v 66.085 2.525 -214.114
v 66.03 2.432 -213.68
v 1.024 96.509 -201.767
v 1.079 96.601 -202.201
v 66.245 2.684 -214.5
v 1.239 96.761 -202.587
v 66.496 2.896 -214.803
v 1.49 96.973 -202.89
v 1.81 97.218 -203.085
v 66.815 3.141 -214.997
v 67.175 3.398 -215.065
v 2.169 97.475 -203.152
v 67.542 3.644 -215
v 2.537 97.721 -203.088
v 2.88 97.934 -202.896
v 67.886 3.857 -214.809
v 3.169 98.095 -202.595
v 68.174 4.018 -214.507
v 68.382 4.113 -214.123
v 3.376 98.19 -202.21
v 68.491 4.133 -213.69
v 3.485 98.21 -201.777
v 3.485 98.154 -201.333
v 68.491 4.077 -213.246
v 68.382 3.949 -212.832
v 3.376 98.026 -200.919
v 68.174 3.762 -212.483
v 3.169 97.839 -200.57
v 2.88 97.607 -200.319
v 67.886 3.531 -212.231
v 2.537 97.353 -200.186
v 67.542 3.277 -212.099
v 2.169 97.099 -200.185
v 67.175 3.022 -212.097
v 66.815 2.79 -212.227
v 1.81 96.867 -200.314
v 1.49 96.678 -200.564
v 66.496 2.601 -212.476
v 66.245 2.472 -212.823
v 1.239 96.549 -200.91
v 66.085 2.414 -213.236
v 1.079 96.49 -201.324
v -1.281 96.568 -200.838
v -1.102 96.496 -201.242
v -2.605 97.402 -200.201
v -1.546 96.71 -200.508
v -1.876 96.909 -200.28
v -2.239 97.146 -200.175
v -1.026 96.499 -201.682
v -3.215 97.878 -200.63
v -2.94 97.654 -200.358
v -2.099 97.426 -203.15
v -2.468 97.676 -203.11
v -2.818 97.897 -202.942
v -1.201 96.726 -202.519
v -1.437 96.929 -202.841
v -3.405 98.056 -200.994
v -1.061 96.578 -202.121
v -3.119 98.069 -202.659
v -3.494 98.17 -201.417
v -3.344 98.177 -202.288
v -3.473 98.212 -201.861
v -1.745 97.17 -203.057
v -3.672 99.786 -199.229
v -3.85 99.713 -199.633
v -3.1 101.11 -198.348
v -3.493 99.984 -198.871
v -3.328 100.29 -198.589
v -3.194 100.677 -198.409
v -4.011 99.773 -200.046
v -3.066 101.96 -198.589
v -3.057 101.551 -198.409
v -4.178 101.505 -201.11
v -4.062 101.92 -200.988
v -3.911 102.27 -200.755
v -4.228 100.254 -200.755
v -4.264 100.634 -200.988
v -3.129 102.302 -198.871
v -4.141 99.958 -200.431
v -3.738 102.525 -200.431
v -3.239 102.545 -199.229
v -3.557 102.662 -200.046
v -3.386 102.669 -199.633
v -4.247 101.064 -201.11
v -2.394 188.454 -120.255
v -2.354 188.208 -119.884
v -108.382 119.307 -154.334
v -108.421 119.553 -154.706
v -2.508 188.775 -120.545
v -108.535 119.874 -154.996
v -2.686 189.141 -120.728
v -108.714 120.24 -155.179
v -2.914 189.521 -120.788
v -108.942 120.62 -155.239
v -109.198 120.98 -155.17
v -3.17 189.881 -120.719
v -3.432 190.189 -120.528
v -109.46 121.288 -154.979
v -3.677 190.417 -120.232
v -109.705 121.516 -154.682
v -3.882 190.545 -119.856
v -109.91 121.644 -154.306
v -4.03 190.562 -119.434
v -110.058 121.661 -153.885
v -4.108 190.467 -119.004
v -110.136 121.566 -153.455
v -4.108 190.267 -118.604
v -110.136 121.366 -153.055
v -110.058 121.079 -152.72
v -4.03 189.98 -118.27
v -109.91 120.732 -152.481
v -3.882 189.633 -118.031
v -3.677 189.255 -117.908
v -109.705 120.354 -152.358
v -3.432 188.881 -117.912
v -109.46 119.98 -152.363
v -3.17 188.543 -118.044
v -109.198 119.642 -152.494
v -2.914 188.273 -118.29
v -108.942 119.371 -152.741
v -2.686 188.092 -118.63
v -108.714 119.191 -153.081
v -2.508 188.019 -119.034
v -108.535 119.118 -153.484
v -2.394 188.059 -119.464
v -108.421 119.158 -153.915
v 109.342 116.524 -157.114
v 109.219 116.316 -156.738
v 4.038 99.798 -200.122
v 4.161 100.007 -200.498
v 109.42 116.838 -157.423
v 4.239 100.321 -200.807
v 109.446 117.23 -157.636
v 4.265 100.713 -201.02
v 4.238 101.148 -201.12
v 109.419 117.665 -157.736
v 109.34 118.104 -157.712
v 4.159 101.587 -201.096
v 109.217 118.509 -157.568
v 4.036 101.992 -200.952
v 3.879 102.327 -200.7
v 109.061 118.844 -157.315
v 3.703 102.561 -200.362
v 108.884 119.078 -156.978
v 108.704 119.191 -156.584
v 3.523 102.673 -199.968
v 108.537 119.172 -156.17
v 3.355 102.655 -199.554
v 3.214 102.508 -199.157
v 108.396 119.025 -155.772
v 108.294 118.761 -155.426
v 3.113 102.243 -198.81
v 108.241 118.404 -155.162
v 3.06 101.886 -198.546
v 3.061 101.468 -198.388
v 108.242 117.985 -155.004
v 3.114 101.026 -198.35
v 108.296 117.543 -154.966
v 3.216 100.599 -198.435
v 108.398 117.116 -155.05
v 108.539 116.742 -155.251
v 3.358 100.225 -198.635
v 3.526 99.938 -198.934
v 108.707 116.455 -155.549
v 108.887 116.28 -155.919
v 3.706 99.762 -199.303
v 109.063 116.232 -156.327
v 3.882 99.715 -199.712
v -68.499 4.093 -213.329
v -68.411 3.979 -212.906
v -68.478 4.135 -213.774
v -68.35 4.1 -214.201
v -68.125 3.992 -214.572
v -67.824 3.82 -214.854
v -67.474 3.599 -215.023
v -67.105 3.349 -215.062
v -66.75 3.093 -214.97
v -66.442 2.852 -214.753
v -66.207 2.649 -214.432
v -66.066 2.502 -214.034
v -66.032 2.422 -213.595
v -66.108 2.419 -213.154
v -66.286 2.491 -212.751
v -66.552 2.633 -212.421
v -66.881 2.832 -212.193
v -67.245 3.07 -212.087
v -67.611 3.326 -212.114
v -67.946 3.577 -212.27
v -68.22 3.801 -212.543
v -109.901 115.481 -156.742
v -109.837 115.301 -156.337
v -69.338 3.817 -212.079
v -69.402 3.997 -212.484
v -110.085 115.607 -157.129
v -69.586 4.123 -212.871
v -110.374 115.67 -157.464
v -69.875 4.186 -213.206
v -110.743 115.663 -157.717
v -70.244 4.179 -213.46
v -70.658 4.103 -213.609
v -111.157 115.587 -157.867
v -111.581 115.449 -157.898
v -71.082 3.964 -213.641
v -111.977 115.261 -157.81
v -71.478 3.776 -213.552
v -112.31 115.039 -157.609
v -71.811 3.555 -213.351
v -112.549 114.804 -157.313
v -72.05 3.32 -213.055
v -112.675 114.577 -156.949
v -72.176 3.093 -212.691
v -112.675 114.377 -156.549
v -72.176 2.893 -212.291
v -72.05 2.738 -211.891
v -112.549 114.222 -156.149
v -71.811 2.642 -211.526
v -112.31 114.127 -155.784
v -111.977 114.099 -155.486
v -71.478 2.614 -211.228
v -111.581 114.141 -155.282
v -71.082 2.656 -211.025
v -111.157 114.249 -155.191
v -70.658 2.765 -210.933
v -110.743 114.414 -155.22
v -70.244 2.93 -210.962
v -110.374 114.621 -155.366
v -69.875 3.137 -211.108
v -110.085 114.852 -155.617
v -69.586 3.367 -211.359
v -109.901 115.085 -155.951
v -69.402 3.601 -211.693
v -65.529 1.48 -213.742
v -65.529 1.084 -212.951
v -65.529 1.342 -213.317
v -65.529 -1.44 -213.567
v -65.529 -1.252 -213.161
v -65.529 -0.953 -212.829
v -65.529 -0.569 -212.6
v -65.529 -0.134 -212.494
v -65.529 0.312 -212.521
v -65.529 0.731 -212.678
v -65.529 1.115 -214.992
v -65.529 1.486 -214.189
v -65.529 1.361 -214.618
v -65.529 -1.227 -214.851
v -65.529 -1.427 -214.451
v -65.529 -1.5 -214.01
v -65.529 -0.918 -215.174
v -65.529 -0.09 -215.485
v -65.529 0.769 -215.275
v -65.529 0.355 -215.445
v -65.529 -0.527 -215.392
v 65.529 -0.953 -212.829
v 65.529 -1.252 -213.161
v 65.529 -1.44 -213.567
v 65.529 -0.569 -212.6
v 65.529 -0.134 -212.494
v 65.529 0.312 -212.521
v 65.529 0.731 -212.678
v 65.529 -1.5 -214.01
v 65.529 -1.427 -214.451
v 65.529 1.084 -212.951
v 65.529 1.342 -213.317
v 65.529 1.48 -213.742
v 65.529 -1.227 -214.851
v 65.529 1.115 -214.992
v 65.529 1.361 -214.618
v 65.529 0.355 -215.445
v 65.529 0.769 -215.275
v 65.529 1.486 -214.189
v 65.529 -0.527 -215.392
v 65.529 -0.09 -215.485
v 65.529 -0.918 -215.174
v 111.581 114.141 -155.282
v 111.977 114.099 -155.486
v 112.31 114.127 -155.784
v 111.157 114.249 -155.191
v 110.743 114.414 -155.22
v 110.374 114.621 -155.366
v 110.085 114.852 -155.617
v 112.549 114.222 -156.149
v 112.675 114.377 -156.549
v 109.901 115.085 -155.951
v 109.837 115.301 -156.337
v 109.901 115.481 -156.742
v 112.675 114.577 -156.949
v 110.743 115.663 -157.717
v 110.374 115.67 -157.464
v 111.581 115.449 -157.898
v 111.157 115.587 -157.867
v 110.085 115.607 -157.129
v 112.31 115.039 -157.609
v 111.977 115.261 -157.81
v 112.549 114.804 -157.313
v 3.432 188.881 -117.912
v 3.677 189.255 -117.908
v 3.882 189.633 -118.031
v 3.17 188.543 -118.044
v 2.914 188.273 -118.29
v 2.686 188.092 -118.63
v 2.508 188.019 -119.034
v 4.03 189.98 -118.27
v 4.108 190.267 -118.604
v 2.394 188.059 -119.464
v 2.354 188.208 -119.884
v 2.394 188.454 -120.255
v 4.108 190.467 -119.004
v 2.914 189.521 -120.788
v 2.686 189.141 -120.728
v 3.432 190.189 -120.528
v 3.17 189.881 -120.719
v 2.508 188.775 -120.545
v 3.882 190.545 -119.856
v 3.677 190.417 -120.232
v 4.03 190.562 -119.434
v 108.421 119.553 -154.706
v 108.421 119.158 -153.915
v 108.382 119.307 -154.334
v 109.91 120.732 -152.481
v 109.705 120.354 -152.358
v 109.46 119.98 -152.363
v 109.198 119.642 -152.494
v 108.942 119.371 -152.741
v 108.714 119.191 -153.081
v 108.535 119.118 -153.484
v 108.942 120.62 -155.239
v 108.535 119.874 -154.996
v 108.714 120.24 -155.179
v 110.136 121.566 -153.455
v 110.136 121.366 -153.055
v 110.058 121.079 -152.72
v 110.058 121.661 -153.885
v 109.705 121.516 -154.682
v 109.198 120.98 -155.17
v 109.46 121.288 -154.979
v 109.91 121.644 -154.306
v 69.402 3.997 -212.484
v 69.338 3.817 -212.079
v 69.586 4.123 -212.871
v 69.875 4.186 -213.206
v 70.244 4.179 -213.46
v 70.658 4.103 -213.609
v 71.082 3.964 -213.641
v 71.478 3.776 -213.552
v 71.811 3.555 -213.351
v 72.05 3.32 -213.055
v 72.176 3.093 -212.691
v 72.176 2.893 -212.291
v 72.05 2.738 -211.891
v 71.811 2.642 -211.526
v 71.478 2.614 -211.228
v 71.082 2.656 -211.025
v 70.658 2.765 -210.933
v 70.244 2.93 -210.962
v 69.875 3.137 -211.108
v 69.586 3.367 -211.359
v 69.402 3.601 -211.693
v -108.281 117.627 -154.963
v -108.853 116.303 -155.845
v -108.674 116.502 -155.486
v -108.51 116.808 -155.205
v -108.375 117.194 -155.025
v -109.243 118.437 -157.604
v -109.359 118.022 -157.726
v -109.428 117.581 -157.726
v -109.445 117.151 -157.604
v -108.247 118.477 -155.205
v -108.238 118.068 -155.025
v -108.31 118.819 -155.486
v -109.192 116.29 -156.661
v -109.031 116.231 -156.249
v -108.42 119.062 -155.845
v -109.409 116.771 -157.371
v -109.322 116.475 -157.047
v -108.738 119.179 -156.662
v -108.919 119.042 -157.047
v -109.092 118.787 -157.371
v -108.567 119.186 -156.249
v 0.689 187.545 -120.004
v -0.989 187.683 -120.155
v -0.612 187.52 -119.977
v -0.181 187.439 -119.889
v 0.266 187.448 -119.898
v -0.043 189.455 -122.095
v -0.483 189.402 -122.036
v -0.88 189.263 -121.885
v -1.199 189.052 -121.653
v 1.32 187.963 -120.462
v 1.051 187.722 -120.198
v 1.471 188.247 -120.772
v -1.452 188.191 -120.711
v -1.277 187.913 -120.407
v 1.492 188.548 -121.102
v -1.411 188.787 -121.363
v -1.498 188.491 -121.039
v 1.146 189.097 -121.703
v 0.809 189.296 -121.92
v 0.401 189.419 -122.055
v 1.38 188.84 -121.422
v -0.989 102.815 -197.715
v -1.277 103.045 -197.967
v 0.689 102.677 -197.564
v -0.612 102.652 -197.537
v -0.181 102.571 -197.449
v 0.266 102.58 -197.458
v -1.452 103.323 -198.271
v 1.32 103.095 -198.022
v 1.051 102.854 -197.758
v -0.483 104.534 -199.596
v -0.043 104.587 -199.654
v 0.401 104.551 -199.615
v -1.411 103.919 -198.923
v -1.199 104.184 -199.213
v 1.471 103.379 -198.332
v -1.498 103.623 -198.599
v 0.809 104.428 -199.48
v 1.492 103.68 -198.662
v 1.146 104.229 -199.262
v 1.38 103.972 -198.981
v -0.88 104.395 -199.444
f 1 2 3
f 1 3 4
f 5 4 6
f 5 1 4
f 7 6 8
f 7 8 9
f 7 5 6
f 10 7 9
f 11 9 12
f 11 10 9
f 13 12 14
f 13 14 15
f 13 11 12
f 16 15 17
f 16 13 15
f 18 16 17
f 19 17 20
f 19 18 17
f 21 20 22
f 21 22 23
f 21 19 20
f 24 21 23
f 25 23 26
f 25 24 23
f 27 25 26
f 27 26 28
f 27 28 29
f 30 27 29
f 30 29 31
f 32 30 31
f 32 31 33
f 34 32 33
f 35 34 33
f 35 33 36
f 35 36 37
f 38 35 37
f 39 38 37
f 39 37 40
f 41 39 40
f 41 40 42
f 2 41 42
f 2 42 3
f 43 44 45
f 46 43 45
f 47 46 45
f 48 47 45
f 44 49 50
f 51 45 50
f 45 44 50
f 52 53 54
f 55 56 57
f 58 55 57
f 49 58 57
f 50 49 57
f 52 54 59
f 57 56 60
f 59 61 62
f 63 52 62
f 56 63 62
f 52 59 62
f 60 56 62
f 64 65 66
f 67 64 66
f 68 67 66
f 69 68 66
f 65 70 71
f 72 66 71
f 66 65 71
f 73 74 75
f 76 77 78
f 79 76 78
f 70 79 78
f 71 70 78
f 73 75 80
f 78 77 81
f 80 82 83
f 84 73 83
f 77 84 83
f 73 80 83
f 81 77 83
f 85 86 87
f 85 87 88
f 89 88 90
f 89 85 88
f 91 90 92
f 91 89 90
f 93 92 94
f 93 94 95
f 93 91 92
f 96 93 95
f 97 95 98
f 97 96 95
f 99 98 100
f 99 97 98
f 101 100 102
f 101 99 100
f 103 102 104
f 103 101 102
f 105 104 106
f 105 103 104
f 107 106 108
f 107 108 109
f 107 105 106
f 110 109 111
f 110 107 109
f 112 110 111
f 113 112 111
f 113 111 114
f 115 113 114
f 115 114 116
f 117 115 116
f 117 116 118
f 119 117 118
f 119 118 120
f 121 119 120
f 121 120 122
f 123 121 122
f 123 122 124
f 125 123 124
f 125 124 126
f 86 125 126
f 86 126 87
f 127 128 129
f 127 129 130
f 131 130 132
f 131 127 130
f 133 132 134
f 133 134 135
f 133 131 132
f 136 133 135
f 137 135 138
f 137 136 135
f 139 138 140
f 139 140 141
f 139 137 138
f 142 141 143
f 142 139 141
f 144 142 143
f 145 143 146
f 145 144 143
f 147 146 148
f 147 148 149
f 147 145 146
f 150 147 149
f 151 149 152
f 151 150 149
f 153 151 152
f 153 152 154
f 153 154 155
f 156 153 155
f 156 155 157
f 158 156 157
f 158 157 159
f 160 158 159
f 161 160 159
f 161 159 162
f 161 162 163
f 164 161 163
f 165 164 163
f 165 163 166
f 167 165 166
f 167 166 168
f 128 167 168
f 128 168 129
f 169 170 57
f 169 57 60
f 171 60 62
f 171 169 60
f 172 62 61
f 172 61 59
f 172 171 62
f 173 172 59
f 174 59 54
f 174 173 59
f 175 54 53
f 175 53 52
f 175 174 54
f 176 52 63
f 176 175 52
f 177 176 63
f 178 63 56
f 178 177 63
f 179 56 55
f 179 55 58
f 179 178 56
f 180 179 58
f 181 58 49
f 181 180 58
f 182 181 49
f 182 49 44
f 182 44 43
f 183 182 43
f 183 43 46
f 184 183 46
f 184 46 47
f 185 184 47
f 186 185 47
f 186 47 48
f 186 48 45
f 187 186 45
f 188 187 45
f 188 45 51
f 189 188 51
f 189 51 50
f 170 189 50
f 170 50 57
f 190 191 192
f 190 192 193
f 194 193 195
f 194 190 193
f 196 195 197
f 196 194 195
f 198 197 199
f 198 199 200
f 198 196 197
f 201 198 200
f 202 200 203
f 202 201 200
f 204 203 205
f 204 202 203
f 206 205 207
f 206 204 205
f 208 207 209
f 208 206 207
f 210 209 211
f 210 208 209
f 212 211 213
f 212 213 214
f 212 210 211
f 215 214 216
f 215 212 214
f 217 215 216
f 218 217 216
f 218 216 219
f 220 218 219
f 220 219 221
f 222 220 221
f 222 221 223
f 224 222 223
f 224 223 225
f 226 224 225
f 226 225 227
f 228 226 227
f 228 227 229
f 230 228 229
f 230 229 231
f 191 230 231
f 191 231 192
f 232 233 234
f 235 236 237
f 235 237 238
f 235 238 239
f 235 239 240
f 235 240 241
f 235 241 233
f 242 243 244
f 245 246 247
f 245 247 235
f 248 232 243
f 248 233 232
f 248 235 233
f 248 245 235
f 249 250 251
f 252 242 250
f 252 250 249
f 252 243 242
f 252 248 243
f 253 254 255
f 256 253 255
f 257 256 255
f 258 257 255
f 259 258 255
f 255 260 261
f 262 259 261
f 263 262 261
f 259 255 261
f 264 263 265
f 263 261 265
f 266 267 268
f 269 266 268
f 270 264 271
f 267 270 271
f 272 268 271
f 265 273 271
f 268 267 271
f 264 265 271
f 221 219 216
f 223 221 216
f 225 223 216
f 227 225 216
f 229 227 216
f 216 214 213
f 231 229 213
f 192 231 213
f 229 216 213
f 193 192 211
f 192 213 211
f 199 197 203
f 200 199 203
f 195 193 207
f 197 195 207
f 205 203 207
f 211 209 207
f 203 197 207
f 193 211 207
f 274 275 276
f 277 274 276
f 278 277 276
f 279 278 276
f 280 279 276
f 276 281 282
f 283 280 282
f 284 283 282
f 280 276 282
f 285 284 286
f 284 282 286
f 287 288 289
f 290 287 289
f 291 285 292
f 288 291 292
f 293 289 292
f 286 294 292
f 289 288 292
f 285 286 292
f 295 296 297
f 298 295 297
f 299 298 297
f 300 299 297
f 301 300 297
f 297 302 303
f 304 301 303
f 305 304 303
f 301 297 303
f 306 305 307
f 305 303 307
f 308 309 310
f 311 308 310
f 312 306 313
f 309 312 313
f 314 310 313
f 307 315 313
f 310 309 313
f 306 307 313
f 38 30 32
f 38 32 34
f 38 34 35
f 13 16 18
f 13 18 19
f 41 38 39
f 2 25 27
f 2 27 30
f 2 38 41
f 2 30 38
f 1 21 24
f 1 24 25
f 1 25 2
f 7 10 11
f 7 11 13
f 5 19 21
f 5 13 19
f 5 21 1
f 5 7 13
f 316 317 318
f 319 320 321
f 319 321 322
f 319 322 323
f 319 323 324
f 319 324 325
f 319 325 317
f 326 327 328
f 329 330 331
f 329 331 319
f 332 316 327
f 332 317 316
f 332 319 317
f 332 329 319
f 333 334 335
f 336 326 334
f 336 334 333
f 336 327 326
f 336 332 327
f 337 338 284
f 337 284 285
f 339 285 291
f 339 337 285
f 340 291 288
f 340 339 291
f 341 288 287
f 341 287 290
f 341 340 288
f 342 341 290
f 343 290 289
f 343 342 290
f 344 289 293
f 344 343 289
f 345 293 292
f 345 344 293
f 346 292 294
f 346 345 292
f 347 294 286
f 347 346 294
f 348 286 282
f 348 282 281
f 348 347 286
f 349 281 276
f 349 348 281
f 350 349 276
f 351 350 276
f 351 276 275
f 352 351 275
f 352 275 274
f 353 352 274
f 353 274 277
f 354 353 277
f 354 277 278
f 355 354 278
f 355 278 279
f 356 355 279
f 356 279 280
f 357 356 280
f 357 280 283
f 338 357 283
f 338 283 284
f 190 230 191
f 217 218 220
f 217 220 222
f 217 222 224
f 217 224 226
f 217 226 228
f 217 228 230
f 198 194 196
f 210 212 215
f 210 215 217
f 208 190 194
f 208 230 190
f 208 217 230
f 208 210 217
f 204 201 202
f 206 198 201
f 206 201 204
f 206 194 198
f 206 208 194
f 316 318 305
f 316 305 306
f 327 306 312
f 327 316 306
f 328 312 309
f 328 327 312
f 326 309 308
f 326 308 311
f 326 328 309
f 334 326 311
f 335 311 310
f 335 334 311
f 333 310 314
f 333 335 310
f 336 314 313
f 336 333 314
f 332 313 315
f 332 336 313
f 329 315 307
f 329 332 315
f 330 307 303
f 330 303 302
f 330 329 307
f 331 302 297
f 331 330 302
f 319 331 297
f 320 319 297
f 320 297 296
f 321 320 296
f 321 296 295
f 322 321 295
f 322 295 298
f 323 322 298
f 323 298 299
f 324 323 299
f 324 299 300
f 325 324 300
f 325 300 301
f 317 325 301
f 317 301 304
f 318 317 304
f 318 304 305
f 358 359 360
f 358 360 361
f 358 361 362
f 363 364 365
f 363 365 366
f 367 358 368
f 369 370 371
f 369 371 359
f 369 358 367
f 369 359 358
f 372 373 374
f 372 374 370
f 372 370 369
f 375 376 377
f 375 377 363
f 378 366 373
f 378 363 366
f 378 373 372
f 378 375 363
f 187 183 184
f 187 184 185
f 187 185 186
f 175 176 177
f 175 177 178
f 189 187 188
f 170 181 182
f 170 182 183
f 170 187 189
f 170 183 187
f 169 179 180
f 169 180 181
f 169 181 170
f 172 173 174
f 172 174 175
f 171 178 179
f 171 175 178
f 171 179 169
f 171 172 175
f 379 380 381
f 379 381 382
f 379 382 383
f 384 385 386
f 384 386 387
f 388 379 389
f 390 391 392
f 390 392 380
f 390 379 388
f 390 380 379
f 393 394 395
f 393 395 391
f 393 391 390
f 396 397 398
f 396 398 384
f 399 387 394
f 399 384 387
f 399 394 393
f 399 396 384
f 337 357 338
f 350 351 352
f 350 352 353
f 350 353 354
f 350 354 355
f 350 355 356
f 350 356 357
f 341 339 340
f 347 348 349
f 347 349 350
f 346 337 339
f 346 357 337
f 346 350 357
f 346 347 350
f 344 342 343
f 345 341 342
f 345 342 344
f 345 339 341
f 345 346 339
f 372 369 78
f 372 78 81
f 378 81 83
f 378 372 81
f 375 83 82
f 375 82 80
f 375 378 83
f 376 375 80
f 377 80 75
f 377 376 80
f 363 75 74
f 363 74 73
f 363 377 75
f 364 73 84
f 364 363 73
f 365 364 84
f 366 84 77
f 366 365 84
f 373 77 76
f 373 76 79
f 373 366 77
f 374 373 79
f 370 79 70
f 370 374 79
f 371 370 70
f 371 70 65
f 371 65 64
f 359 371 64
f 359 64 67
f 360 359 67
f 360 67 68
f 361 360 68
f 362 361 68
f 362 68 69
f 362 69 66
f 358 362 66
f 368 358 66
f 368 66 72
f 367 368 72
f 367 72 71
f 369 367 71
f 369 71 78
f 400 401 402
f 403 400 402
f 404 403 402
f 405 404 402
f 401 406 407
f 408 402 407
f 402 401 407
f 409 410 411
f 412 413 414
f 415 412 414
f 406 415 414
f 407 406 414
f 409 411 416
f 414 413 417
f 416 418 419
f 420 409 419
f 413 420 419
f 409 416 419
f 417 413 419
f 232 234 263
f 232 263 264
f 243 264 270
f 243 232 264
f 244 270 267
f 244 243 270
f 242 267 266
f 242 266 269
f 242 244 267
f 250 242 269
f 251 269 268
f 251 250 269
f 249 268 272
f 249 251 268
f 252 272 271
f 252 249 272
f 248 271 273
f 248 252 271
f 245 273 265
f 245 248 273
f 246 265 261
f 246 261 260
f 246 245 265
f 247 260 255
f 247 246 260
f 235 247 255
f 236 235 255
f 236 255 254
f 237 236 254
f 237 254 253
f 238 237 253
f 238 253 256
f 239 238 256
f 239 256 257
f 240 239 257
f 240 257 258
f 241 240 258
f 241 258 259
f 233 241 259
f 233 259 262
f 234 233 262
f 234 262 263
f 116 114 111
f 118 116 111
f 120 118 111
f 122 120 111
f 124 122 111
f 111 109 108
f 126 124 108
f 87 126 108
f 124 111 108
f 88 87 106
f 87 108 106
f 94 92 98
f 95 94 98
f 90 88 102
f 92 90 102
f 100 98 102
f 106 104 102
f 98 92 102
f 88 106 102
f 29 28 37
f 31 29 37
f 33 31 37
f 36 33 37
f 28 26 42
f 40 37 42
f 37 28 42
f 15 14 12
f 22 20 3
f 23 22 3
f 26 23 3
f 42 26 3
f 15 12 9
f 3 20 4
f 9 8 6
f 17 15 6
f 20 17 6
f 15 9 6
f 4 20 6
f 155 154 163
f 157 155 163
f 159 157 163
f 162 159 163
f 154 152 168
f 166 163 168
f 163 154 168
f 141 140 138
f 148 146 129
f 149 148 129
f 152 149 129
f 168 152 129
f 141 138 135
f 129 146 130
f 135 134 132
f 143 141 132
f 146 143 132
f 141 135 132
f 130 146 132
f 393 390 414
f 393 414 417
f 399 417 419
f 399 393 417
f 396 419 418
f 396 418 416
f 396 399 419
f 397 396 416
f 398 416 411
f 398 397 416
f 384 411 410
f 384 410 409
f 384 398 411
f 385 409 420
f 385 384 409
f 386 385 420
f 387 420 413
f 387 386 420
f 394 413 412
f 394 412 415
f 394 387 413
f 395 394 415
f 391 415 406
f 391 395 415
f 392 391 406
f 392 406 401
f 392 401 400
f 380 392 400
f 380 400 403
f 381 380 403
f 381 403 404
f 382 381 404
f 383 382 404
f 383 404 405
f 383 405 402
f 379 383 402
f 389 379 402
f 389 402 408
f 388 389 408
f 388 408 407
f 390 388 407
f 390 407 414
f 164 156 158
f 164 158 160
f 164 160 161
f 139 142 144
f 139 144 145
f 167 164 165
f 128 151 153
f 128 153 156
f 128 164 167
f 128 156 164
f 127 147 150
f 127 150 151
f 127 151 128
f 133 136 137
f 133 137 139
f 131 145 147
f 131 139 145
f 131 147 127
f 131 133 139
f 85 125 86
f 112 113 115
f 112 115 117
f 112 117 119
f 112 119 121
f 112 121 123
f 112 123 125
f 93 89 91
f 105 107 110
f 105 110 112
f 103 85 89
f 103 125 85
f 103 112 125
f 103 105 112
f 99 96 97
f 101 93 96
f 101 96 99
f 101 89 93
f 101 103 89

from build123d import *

# Parameters (mm, degrees)
SKETCH20_R        = 1.5
SKETCH21_R        = 1.5
CIRPATTERN7_COUNT = 5
CIRPATTERN8_COUNT = 5


with BuildPart() as part:
    # Sweep4: sweep along a path in Sketch16
    with BuildLine(Plane(origin=(66.892069837, 70.138107462, -188.876148446), x_dir=(-0.9490605003608429, 0.10968961318168566, -0.2953850968056427), z_dir=(0.3150939013291542, 0.3303843036360469, -0.8896977269028498))) as sweep4_path:
        Line((68.099364678, 21.05930201), (-0.395234209, -71.280161761))
    # Sketch20 → Sweep4 (sweep)
    with BuildSketch(Plane(origin=(2.261652721, 97.349964421, -201.660580189), x_dir=(-0.8248078173251137, -0.5609339440894788, -0.07102939425057496), z_dir=(0.5654131803198278, -0.8182736416337228, -0.10361555350478845))):
        Circle(SKETCH20_R)
    sweep(path=sweep4_path.line)


with BuildPart() as body_2:
    # Sweep5: sweep along a path in Sketch6
    with BuildLine(Plane(origin=(0, 85.595086467, -171.190172933), x_dir=(-1, 0, 0), z_dir=(0, 0.44721359549995754, -0.8944271909999162))) as sweep5_path:
        Line((-111.263932023, 32.749239761), (-70.764891712, -91.893989874))
    # Sketch21 → Sweep5 (sweep)
    with BuildSketch(Plane(origin=(70.764891712, 3.402603233, -212.28641455), x_dir=(-0.9510565162951541, 0.2763932022500199, 0.1381966011250097), z_dir=(-0.309016994374946, -0.8506508083520407, -0.42532540417601955))):
        Circle(SKETCH21_R)
    sweep(path=sweep5_path.line)


with BuildPart() as cirpattern7_1:
    # CirPattern7: pattern copy
    add(part.part.rotate(Axis((0, 85.595086467, -171.190172933), (2.4466476304515184e-15, 0.44721359549995693, -0.8944271909999164)), 1 * 360 / CIRPATTERN7_COUNT))


with BuildPart() as cirpattern7_2:
    # CirPattern7: pattern copy
    add(part.part.rotate(Axis((0, 85.595086467, -171.190172933), (2.4466476304515184e-15, 0.44721359549995693, -0.8944271909999164)), 2 * 360 / CIRPATTERN7_COUNT))


with BuildPart() as cirpattern7_3:
    # CirPattern7: pattern copy
    add(part.part.rotate(Axis((0, 85.595086467, -171.190172933), (2.4466476304515184e-15, 0.44721359549995693, -0.8944271909999164)), 3 * 360 / CIRPATTERN7_COUNT))


with BuildPart() as cirpattern7_4:
    # CirPattern7: pattern copy
    add(part.part.rotate(Axis((0, 85.595086467, -171.190172933), (2.4466476304515184e-15, 0.44721359549995693, -0.8944271909999164)), 4 * 360 / CIRPATTERN7_COUNT))


with BuildPart() as cirpattern8_1:
    # CirPattern8: pattern copy
    add(body_2.part.rotate(Axis((0, 0, 0), (2.0720596882994017e-15, 0.44721359549995665, -0.8944271909999165)), 1 * 360 / CIRPATTERN8_COUNT))


with BuildPart() as cirpattern8_2:
    # CirPattern8: pattern copy
    add(body_2.part.rotate(Axis((0, 0, 0), (2.0720596882994017e-15, 0.44721359549995665, -0.8944271909999165)), 2 * 360 / CIRPATTERN8_COUNT))


with BuildPart() as cirpattern8_3:
    # CirPattern8: pattern copy
    add(body_2.part.rotate(Axis((0, 0, 0), (2.0720596882994017e-15, 0.44721359549995665, -0.8944271909999165)), 3 * 360 / CIRPATTERN8_COUNT))


with BuildPart() as cirpattern8_4:
    # CirPattern8: pattern copy
    add(body_2.part.rotate(Axis((0, 0, 0), (2.0720596882994017e-15, 0.44721359549995665, -0.8944271909999165)), 4 * 360 / CIRPATTERN8_COUNT))


solid = Compound([part.part, body_2.part, cirpattern7_1.part, cirpattern7_2.part, cirpattern7_3.part, cirpattern7_4.part, cirpattern8_1.part, cirpattern8_2.part, cirpattern8_3.part, cirpattern8_4.part])
